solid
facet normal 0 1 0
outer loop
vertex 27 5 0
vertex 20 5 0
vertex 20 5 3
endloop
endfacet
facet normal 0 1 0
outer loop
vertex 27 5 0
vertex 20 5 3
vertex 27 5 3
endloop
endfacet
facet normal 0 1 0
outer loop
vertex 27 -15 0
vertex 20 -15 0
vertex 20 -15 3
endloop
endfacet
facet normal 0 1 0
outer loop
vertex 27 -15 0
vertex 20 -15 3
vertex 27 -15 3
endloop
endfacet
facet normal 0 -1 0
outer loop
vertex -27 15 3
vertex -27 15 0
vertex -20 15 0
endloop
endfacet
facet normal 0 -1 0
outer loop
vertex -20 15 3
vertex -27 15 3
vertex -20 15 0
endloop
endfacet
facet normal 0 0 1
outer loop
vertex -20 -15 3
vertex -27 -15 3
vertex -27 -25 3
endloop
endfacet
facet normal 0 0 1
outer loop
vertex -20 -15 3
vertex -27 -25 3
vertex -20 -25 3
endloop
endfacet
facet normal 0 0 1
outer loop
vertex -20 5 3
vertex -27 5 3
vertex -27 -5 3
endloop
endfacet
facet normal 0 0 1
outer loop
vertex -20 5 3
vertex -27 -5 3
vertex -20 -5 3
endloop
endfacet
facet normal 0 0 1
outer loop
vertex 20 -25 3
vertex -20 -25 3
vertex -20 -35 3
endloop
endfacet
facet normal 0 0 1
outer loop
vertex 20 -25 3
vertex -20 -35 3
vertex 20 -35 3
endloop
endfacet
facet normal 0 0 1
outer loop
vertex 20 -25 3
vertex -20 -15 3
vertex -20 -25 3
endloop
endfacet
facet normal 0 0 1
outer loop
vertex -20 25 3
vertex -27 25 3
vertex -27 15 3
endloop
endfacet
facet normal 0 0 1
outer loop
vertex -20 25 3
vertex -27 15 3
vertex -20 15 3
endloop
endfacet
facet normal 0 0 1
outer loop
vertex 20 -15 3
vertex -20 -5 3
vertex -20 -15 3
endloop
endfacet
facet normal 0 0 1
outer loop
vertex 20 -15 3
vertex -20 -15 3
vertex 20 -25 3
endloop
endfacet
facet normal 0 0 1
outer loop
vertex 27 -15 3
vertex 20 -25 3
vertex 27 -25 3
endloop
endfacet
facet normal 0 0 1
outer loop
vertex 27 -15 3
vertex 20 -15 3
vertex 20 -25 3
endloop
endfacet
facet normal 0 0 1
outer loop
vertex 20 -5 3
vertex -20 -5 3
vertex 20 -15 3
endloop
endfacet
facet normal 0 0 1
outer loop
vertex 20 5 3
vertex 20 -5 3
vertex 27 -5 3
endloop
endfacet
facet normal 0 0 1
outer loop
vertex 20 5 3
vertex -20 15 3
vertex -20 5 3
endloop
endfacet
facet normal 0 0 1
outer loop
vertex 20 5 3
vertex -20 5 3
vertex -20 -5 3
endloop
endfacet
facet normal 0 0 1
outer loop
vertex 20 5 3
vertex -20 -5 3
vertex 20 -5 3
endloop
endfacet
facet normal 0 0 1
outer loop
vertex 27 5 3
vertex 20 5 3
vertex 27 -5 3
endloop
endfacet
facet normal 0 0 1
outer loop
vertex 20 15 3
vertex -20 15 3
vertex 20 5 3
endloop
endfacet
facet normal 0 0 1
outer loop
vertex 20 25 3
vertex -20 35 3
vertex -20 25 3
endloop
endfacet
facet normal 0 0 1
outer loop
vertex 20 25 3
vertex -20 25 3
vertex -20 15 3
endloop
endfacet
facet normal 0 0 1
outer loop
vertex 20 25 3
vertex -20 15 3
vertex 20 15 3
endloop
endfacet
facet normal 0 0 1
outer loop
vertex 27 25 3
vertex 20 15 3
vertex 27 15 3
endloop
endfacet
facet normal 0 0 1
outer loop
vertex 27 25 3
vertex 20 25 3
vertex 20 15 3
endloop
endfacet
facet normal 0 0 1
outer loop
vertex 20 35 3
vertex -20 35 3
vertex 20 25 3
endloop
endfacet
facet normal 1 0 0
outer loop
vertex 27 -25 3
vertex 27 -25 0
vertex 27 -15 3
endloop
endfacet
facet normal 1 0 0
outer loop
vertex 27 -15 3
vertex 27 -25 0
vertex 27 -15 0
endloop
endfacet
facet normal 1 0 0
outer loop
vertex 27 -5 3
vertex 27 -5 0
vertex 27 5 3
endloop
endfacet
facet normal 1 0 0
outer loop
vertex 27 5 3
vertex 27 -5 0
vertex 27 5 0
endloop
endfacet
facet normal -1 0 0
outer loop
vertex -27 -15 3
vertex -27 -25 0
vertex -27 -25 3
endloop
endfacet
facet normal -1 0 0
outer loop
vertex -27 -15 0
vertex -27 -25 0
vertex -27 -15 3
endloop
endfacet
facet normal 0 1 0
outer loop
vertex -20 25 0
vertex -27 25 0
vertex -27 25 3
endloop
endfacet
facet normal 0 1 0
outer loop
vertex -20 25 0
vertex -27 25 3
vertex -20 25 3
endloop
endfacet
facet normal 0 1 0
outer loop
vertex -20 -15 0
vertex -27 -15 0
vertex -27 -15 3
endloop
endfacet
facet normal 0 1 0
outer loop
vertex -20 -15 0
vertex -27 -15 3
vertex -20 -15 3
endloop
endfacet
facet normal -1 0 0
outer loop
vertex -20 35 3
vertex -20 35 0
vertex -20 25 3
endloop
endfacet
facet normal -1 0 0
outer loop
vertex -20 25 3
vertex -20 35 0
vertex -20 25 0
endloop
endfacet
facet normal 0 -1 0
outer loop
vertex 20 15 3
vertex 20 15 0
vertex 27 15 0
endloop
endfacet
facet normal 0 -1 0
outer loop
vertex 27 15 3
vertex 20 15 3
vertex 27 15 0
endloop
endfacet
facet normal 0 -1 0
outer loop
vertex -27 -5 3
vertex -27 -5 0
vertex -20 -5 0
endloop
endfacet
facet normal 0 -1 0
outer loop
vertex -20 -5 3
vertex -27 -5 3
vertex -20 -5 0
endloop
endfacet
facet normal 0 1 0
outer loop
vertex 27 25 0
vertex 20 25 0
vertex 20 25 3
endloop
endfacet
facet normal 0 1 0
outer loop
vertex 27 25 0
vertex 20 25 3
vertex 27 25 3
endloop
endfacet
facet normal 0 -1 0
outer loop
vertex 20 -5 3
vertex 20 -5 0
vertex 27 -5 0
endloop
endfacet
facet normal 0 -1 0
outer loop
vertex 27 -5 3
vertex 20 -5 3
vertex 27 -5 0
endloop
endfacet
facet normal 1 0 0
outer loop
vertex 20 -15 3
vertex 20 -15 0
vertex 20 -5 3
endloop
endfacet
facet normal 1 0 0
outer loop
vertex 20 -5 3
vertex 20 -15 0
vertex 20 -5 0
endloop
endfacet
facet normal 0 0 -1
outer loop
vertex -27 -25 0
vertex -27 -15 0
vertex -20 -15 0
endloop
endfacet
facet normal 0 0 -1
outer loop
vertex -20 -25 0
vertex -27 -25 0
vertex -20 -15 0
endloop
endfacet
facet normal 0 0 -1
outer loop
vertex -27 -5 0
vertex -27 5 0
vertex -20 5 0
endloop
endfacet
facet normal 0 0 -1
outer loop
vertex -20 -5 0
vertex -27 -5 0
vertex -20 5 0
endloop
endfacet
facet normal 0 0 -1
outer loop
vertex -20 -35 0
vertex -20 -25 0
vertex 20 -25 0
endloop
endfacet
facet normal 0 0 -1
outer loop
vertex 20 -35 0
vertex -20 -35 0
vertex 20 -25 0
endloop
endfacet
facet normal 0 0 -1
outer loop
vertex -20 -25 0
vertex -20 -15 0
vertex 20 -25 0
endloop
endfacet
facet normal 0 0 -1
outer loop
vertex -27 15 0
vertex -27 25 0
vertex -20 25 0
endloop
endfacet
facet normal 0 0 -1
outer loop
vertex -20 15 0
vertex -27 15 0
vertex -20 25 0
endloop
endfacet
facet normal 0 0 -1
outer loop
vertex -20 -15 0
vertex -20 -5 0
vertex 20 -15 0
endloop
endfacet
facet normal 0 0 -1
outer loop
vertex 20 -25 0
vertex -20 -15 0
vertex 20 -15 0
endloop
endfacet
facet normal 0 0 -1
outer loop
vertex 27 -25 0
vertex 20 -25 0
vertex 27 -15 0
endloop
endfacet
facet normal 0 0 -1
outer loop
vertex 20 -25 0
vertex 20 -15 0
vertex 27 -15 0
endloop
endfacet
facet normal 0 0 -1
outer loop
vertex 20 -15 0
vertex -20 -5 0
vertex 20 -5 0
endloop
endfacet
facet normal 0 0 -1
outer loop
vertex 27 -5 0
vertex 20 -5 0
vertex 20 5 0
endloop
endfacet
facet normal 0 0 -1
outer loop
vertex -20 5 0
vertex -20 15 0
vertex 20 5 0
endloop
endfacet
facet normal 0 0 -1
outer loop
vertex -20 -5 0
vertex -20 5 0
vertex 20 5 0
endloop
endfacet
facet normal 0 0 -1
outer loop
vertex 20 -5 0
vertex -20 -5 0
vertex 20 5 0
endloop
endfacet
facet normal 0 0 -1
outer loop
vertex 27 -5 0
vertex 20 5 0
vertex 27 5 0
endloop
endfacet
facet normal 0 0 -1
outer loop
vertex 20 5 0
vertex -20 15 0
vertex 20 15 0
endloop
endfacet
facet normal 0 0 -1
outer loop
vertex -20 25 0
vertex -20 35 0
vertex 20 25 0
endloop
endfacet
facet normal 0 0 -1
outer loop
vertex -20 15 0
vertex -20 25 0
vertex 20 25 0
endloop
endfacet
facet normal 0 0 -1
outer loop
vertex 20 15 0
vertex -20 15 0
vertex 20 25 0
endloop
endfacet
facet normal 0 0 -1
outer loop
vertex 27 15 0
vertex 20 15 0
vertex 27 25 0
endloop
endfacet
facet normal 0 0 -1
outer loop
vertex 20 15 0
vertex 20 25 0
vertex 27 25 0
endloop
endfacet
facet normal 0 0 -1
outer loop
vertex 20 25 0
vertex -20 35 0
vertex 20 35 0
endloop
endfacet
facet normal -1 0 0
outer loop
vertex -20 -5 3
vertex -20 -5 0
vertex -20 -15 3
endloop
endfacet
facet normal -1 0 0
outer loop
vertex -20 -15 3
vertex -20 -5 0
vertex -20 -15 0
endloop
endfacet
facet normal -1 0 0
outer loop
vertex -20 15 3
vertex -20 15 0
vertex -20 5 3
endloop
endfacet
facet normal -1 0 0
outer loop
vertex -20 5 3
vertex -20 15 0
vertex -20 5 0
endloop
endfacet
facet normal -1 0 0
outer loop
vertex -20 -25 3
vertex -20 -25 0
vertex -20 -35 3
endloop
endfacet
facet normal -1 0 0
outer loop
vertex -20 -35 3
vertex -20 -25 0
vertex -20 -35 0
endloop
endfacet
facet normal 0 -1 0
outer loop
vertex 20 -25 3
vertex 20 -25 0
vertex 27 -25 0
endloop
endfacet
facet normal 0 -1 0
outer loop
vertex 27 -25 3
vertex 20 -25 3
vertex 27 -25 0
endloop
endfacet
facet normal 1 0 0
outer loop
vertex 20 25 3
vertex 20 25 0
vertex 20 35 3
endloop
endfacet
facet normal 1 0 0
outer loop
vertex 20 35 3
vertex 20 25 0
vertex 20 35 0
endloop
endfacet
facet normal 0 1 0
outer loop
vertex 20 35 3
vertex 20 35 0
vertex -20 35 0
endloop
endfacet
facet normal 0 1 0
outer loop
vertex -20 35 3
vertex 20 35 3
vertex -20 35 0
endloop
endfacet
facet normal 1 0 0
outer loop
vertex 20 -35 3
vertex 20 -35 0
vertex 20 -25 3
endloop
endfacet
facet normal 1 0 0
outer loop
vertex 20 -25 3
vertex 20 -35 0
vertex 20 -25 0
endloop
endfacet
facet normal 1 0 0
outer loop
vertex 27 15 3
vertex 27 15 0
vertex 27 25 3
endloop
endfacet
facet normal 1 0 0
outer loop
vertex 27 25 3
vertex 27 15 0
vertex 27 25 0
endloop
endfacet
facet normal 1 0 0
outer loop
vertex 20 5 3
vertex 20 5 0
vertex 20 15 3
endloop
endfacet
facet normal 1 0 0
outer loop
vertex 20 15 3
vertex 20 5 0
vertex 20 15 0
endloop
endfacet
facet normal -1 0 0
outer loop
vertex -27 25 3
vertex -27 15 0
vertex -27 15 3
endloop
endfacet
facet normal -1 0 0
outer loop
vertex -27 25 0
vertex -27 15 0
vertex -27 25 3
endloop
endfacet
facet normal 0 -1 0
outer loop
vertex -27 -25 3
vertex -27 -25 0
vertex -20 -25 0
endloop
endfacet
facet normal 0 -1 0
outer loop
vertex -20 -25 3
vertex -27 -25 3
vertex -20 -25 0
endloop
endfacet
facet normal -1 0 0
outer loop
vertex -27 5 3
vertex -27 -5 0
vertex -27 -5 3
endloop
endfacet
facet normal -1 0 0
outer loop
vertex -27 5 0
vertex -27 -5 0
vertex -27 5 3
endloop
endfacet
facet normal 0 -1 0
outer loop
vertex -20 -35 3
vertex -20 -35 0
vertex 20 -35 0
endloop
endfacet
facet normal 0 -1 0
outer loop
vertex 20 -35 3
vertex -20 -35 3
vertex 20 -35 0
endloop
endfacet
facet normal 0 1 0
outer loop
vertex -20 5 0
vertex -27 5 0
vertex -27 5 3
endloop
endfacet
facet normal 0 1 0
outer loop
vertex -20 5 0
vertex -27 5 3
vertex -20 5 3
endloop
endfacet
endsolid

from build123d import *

# Parameters (mm, degrees)
ESBO_O1_W                = 7
ESBO_O1_H                = 10
RESSALTO_EXTRUS_O1_DEPTH = 3


with BuildPart() as part:
    # Esboço1 → Ressalto-extrusão1 (new body)
    with BuildSketch(Plane.XY):
        with Locations((-23.5, 0)):
            Rectangle(ESBO_O1_W, ESBO_O1_H)
        with Locations((-23.5, -20)):
            Rectangle(ESBO_O1_W, ESBO_O1_H)
        with Locations((23.5, 20)):
            Rectangle(ESBO_O1_W, ESBO_O1_H)
        with Locations((23.5, 0)):
            Rectangle(ESBO_O1_W, ESBO_O1_H)
        with Locations((23.5, -20)):
            Rectangle(ESBO_O1_W, ESBO_O1_H)
        Polygon((0, -35), (0, 35), (-20, 35), (-20, 25), (-20, 15), (-20, 5), (-20, -5), (-20, -15), (-20, -25), (-20, -35), align=None)
        Polygon((20, 35), (0, 35), (0, -35), (20, -35), (20, -25), (20, -15), (20, -5), (20, 5), (20, 15), (20, 25), align=None)
        with Locations((-23.5, 20)):
            Rectangle(ESBO_O1_W, ESBO_O1_H)
    extrude(amount=RESSALTO_EXTRUS_O1_DEPTH)


solid = part.part
